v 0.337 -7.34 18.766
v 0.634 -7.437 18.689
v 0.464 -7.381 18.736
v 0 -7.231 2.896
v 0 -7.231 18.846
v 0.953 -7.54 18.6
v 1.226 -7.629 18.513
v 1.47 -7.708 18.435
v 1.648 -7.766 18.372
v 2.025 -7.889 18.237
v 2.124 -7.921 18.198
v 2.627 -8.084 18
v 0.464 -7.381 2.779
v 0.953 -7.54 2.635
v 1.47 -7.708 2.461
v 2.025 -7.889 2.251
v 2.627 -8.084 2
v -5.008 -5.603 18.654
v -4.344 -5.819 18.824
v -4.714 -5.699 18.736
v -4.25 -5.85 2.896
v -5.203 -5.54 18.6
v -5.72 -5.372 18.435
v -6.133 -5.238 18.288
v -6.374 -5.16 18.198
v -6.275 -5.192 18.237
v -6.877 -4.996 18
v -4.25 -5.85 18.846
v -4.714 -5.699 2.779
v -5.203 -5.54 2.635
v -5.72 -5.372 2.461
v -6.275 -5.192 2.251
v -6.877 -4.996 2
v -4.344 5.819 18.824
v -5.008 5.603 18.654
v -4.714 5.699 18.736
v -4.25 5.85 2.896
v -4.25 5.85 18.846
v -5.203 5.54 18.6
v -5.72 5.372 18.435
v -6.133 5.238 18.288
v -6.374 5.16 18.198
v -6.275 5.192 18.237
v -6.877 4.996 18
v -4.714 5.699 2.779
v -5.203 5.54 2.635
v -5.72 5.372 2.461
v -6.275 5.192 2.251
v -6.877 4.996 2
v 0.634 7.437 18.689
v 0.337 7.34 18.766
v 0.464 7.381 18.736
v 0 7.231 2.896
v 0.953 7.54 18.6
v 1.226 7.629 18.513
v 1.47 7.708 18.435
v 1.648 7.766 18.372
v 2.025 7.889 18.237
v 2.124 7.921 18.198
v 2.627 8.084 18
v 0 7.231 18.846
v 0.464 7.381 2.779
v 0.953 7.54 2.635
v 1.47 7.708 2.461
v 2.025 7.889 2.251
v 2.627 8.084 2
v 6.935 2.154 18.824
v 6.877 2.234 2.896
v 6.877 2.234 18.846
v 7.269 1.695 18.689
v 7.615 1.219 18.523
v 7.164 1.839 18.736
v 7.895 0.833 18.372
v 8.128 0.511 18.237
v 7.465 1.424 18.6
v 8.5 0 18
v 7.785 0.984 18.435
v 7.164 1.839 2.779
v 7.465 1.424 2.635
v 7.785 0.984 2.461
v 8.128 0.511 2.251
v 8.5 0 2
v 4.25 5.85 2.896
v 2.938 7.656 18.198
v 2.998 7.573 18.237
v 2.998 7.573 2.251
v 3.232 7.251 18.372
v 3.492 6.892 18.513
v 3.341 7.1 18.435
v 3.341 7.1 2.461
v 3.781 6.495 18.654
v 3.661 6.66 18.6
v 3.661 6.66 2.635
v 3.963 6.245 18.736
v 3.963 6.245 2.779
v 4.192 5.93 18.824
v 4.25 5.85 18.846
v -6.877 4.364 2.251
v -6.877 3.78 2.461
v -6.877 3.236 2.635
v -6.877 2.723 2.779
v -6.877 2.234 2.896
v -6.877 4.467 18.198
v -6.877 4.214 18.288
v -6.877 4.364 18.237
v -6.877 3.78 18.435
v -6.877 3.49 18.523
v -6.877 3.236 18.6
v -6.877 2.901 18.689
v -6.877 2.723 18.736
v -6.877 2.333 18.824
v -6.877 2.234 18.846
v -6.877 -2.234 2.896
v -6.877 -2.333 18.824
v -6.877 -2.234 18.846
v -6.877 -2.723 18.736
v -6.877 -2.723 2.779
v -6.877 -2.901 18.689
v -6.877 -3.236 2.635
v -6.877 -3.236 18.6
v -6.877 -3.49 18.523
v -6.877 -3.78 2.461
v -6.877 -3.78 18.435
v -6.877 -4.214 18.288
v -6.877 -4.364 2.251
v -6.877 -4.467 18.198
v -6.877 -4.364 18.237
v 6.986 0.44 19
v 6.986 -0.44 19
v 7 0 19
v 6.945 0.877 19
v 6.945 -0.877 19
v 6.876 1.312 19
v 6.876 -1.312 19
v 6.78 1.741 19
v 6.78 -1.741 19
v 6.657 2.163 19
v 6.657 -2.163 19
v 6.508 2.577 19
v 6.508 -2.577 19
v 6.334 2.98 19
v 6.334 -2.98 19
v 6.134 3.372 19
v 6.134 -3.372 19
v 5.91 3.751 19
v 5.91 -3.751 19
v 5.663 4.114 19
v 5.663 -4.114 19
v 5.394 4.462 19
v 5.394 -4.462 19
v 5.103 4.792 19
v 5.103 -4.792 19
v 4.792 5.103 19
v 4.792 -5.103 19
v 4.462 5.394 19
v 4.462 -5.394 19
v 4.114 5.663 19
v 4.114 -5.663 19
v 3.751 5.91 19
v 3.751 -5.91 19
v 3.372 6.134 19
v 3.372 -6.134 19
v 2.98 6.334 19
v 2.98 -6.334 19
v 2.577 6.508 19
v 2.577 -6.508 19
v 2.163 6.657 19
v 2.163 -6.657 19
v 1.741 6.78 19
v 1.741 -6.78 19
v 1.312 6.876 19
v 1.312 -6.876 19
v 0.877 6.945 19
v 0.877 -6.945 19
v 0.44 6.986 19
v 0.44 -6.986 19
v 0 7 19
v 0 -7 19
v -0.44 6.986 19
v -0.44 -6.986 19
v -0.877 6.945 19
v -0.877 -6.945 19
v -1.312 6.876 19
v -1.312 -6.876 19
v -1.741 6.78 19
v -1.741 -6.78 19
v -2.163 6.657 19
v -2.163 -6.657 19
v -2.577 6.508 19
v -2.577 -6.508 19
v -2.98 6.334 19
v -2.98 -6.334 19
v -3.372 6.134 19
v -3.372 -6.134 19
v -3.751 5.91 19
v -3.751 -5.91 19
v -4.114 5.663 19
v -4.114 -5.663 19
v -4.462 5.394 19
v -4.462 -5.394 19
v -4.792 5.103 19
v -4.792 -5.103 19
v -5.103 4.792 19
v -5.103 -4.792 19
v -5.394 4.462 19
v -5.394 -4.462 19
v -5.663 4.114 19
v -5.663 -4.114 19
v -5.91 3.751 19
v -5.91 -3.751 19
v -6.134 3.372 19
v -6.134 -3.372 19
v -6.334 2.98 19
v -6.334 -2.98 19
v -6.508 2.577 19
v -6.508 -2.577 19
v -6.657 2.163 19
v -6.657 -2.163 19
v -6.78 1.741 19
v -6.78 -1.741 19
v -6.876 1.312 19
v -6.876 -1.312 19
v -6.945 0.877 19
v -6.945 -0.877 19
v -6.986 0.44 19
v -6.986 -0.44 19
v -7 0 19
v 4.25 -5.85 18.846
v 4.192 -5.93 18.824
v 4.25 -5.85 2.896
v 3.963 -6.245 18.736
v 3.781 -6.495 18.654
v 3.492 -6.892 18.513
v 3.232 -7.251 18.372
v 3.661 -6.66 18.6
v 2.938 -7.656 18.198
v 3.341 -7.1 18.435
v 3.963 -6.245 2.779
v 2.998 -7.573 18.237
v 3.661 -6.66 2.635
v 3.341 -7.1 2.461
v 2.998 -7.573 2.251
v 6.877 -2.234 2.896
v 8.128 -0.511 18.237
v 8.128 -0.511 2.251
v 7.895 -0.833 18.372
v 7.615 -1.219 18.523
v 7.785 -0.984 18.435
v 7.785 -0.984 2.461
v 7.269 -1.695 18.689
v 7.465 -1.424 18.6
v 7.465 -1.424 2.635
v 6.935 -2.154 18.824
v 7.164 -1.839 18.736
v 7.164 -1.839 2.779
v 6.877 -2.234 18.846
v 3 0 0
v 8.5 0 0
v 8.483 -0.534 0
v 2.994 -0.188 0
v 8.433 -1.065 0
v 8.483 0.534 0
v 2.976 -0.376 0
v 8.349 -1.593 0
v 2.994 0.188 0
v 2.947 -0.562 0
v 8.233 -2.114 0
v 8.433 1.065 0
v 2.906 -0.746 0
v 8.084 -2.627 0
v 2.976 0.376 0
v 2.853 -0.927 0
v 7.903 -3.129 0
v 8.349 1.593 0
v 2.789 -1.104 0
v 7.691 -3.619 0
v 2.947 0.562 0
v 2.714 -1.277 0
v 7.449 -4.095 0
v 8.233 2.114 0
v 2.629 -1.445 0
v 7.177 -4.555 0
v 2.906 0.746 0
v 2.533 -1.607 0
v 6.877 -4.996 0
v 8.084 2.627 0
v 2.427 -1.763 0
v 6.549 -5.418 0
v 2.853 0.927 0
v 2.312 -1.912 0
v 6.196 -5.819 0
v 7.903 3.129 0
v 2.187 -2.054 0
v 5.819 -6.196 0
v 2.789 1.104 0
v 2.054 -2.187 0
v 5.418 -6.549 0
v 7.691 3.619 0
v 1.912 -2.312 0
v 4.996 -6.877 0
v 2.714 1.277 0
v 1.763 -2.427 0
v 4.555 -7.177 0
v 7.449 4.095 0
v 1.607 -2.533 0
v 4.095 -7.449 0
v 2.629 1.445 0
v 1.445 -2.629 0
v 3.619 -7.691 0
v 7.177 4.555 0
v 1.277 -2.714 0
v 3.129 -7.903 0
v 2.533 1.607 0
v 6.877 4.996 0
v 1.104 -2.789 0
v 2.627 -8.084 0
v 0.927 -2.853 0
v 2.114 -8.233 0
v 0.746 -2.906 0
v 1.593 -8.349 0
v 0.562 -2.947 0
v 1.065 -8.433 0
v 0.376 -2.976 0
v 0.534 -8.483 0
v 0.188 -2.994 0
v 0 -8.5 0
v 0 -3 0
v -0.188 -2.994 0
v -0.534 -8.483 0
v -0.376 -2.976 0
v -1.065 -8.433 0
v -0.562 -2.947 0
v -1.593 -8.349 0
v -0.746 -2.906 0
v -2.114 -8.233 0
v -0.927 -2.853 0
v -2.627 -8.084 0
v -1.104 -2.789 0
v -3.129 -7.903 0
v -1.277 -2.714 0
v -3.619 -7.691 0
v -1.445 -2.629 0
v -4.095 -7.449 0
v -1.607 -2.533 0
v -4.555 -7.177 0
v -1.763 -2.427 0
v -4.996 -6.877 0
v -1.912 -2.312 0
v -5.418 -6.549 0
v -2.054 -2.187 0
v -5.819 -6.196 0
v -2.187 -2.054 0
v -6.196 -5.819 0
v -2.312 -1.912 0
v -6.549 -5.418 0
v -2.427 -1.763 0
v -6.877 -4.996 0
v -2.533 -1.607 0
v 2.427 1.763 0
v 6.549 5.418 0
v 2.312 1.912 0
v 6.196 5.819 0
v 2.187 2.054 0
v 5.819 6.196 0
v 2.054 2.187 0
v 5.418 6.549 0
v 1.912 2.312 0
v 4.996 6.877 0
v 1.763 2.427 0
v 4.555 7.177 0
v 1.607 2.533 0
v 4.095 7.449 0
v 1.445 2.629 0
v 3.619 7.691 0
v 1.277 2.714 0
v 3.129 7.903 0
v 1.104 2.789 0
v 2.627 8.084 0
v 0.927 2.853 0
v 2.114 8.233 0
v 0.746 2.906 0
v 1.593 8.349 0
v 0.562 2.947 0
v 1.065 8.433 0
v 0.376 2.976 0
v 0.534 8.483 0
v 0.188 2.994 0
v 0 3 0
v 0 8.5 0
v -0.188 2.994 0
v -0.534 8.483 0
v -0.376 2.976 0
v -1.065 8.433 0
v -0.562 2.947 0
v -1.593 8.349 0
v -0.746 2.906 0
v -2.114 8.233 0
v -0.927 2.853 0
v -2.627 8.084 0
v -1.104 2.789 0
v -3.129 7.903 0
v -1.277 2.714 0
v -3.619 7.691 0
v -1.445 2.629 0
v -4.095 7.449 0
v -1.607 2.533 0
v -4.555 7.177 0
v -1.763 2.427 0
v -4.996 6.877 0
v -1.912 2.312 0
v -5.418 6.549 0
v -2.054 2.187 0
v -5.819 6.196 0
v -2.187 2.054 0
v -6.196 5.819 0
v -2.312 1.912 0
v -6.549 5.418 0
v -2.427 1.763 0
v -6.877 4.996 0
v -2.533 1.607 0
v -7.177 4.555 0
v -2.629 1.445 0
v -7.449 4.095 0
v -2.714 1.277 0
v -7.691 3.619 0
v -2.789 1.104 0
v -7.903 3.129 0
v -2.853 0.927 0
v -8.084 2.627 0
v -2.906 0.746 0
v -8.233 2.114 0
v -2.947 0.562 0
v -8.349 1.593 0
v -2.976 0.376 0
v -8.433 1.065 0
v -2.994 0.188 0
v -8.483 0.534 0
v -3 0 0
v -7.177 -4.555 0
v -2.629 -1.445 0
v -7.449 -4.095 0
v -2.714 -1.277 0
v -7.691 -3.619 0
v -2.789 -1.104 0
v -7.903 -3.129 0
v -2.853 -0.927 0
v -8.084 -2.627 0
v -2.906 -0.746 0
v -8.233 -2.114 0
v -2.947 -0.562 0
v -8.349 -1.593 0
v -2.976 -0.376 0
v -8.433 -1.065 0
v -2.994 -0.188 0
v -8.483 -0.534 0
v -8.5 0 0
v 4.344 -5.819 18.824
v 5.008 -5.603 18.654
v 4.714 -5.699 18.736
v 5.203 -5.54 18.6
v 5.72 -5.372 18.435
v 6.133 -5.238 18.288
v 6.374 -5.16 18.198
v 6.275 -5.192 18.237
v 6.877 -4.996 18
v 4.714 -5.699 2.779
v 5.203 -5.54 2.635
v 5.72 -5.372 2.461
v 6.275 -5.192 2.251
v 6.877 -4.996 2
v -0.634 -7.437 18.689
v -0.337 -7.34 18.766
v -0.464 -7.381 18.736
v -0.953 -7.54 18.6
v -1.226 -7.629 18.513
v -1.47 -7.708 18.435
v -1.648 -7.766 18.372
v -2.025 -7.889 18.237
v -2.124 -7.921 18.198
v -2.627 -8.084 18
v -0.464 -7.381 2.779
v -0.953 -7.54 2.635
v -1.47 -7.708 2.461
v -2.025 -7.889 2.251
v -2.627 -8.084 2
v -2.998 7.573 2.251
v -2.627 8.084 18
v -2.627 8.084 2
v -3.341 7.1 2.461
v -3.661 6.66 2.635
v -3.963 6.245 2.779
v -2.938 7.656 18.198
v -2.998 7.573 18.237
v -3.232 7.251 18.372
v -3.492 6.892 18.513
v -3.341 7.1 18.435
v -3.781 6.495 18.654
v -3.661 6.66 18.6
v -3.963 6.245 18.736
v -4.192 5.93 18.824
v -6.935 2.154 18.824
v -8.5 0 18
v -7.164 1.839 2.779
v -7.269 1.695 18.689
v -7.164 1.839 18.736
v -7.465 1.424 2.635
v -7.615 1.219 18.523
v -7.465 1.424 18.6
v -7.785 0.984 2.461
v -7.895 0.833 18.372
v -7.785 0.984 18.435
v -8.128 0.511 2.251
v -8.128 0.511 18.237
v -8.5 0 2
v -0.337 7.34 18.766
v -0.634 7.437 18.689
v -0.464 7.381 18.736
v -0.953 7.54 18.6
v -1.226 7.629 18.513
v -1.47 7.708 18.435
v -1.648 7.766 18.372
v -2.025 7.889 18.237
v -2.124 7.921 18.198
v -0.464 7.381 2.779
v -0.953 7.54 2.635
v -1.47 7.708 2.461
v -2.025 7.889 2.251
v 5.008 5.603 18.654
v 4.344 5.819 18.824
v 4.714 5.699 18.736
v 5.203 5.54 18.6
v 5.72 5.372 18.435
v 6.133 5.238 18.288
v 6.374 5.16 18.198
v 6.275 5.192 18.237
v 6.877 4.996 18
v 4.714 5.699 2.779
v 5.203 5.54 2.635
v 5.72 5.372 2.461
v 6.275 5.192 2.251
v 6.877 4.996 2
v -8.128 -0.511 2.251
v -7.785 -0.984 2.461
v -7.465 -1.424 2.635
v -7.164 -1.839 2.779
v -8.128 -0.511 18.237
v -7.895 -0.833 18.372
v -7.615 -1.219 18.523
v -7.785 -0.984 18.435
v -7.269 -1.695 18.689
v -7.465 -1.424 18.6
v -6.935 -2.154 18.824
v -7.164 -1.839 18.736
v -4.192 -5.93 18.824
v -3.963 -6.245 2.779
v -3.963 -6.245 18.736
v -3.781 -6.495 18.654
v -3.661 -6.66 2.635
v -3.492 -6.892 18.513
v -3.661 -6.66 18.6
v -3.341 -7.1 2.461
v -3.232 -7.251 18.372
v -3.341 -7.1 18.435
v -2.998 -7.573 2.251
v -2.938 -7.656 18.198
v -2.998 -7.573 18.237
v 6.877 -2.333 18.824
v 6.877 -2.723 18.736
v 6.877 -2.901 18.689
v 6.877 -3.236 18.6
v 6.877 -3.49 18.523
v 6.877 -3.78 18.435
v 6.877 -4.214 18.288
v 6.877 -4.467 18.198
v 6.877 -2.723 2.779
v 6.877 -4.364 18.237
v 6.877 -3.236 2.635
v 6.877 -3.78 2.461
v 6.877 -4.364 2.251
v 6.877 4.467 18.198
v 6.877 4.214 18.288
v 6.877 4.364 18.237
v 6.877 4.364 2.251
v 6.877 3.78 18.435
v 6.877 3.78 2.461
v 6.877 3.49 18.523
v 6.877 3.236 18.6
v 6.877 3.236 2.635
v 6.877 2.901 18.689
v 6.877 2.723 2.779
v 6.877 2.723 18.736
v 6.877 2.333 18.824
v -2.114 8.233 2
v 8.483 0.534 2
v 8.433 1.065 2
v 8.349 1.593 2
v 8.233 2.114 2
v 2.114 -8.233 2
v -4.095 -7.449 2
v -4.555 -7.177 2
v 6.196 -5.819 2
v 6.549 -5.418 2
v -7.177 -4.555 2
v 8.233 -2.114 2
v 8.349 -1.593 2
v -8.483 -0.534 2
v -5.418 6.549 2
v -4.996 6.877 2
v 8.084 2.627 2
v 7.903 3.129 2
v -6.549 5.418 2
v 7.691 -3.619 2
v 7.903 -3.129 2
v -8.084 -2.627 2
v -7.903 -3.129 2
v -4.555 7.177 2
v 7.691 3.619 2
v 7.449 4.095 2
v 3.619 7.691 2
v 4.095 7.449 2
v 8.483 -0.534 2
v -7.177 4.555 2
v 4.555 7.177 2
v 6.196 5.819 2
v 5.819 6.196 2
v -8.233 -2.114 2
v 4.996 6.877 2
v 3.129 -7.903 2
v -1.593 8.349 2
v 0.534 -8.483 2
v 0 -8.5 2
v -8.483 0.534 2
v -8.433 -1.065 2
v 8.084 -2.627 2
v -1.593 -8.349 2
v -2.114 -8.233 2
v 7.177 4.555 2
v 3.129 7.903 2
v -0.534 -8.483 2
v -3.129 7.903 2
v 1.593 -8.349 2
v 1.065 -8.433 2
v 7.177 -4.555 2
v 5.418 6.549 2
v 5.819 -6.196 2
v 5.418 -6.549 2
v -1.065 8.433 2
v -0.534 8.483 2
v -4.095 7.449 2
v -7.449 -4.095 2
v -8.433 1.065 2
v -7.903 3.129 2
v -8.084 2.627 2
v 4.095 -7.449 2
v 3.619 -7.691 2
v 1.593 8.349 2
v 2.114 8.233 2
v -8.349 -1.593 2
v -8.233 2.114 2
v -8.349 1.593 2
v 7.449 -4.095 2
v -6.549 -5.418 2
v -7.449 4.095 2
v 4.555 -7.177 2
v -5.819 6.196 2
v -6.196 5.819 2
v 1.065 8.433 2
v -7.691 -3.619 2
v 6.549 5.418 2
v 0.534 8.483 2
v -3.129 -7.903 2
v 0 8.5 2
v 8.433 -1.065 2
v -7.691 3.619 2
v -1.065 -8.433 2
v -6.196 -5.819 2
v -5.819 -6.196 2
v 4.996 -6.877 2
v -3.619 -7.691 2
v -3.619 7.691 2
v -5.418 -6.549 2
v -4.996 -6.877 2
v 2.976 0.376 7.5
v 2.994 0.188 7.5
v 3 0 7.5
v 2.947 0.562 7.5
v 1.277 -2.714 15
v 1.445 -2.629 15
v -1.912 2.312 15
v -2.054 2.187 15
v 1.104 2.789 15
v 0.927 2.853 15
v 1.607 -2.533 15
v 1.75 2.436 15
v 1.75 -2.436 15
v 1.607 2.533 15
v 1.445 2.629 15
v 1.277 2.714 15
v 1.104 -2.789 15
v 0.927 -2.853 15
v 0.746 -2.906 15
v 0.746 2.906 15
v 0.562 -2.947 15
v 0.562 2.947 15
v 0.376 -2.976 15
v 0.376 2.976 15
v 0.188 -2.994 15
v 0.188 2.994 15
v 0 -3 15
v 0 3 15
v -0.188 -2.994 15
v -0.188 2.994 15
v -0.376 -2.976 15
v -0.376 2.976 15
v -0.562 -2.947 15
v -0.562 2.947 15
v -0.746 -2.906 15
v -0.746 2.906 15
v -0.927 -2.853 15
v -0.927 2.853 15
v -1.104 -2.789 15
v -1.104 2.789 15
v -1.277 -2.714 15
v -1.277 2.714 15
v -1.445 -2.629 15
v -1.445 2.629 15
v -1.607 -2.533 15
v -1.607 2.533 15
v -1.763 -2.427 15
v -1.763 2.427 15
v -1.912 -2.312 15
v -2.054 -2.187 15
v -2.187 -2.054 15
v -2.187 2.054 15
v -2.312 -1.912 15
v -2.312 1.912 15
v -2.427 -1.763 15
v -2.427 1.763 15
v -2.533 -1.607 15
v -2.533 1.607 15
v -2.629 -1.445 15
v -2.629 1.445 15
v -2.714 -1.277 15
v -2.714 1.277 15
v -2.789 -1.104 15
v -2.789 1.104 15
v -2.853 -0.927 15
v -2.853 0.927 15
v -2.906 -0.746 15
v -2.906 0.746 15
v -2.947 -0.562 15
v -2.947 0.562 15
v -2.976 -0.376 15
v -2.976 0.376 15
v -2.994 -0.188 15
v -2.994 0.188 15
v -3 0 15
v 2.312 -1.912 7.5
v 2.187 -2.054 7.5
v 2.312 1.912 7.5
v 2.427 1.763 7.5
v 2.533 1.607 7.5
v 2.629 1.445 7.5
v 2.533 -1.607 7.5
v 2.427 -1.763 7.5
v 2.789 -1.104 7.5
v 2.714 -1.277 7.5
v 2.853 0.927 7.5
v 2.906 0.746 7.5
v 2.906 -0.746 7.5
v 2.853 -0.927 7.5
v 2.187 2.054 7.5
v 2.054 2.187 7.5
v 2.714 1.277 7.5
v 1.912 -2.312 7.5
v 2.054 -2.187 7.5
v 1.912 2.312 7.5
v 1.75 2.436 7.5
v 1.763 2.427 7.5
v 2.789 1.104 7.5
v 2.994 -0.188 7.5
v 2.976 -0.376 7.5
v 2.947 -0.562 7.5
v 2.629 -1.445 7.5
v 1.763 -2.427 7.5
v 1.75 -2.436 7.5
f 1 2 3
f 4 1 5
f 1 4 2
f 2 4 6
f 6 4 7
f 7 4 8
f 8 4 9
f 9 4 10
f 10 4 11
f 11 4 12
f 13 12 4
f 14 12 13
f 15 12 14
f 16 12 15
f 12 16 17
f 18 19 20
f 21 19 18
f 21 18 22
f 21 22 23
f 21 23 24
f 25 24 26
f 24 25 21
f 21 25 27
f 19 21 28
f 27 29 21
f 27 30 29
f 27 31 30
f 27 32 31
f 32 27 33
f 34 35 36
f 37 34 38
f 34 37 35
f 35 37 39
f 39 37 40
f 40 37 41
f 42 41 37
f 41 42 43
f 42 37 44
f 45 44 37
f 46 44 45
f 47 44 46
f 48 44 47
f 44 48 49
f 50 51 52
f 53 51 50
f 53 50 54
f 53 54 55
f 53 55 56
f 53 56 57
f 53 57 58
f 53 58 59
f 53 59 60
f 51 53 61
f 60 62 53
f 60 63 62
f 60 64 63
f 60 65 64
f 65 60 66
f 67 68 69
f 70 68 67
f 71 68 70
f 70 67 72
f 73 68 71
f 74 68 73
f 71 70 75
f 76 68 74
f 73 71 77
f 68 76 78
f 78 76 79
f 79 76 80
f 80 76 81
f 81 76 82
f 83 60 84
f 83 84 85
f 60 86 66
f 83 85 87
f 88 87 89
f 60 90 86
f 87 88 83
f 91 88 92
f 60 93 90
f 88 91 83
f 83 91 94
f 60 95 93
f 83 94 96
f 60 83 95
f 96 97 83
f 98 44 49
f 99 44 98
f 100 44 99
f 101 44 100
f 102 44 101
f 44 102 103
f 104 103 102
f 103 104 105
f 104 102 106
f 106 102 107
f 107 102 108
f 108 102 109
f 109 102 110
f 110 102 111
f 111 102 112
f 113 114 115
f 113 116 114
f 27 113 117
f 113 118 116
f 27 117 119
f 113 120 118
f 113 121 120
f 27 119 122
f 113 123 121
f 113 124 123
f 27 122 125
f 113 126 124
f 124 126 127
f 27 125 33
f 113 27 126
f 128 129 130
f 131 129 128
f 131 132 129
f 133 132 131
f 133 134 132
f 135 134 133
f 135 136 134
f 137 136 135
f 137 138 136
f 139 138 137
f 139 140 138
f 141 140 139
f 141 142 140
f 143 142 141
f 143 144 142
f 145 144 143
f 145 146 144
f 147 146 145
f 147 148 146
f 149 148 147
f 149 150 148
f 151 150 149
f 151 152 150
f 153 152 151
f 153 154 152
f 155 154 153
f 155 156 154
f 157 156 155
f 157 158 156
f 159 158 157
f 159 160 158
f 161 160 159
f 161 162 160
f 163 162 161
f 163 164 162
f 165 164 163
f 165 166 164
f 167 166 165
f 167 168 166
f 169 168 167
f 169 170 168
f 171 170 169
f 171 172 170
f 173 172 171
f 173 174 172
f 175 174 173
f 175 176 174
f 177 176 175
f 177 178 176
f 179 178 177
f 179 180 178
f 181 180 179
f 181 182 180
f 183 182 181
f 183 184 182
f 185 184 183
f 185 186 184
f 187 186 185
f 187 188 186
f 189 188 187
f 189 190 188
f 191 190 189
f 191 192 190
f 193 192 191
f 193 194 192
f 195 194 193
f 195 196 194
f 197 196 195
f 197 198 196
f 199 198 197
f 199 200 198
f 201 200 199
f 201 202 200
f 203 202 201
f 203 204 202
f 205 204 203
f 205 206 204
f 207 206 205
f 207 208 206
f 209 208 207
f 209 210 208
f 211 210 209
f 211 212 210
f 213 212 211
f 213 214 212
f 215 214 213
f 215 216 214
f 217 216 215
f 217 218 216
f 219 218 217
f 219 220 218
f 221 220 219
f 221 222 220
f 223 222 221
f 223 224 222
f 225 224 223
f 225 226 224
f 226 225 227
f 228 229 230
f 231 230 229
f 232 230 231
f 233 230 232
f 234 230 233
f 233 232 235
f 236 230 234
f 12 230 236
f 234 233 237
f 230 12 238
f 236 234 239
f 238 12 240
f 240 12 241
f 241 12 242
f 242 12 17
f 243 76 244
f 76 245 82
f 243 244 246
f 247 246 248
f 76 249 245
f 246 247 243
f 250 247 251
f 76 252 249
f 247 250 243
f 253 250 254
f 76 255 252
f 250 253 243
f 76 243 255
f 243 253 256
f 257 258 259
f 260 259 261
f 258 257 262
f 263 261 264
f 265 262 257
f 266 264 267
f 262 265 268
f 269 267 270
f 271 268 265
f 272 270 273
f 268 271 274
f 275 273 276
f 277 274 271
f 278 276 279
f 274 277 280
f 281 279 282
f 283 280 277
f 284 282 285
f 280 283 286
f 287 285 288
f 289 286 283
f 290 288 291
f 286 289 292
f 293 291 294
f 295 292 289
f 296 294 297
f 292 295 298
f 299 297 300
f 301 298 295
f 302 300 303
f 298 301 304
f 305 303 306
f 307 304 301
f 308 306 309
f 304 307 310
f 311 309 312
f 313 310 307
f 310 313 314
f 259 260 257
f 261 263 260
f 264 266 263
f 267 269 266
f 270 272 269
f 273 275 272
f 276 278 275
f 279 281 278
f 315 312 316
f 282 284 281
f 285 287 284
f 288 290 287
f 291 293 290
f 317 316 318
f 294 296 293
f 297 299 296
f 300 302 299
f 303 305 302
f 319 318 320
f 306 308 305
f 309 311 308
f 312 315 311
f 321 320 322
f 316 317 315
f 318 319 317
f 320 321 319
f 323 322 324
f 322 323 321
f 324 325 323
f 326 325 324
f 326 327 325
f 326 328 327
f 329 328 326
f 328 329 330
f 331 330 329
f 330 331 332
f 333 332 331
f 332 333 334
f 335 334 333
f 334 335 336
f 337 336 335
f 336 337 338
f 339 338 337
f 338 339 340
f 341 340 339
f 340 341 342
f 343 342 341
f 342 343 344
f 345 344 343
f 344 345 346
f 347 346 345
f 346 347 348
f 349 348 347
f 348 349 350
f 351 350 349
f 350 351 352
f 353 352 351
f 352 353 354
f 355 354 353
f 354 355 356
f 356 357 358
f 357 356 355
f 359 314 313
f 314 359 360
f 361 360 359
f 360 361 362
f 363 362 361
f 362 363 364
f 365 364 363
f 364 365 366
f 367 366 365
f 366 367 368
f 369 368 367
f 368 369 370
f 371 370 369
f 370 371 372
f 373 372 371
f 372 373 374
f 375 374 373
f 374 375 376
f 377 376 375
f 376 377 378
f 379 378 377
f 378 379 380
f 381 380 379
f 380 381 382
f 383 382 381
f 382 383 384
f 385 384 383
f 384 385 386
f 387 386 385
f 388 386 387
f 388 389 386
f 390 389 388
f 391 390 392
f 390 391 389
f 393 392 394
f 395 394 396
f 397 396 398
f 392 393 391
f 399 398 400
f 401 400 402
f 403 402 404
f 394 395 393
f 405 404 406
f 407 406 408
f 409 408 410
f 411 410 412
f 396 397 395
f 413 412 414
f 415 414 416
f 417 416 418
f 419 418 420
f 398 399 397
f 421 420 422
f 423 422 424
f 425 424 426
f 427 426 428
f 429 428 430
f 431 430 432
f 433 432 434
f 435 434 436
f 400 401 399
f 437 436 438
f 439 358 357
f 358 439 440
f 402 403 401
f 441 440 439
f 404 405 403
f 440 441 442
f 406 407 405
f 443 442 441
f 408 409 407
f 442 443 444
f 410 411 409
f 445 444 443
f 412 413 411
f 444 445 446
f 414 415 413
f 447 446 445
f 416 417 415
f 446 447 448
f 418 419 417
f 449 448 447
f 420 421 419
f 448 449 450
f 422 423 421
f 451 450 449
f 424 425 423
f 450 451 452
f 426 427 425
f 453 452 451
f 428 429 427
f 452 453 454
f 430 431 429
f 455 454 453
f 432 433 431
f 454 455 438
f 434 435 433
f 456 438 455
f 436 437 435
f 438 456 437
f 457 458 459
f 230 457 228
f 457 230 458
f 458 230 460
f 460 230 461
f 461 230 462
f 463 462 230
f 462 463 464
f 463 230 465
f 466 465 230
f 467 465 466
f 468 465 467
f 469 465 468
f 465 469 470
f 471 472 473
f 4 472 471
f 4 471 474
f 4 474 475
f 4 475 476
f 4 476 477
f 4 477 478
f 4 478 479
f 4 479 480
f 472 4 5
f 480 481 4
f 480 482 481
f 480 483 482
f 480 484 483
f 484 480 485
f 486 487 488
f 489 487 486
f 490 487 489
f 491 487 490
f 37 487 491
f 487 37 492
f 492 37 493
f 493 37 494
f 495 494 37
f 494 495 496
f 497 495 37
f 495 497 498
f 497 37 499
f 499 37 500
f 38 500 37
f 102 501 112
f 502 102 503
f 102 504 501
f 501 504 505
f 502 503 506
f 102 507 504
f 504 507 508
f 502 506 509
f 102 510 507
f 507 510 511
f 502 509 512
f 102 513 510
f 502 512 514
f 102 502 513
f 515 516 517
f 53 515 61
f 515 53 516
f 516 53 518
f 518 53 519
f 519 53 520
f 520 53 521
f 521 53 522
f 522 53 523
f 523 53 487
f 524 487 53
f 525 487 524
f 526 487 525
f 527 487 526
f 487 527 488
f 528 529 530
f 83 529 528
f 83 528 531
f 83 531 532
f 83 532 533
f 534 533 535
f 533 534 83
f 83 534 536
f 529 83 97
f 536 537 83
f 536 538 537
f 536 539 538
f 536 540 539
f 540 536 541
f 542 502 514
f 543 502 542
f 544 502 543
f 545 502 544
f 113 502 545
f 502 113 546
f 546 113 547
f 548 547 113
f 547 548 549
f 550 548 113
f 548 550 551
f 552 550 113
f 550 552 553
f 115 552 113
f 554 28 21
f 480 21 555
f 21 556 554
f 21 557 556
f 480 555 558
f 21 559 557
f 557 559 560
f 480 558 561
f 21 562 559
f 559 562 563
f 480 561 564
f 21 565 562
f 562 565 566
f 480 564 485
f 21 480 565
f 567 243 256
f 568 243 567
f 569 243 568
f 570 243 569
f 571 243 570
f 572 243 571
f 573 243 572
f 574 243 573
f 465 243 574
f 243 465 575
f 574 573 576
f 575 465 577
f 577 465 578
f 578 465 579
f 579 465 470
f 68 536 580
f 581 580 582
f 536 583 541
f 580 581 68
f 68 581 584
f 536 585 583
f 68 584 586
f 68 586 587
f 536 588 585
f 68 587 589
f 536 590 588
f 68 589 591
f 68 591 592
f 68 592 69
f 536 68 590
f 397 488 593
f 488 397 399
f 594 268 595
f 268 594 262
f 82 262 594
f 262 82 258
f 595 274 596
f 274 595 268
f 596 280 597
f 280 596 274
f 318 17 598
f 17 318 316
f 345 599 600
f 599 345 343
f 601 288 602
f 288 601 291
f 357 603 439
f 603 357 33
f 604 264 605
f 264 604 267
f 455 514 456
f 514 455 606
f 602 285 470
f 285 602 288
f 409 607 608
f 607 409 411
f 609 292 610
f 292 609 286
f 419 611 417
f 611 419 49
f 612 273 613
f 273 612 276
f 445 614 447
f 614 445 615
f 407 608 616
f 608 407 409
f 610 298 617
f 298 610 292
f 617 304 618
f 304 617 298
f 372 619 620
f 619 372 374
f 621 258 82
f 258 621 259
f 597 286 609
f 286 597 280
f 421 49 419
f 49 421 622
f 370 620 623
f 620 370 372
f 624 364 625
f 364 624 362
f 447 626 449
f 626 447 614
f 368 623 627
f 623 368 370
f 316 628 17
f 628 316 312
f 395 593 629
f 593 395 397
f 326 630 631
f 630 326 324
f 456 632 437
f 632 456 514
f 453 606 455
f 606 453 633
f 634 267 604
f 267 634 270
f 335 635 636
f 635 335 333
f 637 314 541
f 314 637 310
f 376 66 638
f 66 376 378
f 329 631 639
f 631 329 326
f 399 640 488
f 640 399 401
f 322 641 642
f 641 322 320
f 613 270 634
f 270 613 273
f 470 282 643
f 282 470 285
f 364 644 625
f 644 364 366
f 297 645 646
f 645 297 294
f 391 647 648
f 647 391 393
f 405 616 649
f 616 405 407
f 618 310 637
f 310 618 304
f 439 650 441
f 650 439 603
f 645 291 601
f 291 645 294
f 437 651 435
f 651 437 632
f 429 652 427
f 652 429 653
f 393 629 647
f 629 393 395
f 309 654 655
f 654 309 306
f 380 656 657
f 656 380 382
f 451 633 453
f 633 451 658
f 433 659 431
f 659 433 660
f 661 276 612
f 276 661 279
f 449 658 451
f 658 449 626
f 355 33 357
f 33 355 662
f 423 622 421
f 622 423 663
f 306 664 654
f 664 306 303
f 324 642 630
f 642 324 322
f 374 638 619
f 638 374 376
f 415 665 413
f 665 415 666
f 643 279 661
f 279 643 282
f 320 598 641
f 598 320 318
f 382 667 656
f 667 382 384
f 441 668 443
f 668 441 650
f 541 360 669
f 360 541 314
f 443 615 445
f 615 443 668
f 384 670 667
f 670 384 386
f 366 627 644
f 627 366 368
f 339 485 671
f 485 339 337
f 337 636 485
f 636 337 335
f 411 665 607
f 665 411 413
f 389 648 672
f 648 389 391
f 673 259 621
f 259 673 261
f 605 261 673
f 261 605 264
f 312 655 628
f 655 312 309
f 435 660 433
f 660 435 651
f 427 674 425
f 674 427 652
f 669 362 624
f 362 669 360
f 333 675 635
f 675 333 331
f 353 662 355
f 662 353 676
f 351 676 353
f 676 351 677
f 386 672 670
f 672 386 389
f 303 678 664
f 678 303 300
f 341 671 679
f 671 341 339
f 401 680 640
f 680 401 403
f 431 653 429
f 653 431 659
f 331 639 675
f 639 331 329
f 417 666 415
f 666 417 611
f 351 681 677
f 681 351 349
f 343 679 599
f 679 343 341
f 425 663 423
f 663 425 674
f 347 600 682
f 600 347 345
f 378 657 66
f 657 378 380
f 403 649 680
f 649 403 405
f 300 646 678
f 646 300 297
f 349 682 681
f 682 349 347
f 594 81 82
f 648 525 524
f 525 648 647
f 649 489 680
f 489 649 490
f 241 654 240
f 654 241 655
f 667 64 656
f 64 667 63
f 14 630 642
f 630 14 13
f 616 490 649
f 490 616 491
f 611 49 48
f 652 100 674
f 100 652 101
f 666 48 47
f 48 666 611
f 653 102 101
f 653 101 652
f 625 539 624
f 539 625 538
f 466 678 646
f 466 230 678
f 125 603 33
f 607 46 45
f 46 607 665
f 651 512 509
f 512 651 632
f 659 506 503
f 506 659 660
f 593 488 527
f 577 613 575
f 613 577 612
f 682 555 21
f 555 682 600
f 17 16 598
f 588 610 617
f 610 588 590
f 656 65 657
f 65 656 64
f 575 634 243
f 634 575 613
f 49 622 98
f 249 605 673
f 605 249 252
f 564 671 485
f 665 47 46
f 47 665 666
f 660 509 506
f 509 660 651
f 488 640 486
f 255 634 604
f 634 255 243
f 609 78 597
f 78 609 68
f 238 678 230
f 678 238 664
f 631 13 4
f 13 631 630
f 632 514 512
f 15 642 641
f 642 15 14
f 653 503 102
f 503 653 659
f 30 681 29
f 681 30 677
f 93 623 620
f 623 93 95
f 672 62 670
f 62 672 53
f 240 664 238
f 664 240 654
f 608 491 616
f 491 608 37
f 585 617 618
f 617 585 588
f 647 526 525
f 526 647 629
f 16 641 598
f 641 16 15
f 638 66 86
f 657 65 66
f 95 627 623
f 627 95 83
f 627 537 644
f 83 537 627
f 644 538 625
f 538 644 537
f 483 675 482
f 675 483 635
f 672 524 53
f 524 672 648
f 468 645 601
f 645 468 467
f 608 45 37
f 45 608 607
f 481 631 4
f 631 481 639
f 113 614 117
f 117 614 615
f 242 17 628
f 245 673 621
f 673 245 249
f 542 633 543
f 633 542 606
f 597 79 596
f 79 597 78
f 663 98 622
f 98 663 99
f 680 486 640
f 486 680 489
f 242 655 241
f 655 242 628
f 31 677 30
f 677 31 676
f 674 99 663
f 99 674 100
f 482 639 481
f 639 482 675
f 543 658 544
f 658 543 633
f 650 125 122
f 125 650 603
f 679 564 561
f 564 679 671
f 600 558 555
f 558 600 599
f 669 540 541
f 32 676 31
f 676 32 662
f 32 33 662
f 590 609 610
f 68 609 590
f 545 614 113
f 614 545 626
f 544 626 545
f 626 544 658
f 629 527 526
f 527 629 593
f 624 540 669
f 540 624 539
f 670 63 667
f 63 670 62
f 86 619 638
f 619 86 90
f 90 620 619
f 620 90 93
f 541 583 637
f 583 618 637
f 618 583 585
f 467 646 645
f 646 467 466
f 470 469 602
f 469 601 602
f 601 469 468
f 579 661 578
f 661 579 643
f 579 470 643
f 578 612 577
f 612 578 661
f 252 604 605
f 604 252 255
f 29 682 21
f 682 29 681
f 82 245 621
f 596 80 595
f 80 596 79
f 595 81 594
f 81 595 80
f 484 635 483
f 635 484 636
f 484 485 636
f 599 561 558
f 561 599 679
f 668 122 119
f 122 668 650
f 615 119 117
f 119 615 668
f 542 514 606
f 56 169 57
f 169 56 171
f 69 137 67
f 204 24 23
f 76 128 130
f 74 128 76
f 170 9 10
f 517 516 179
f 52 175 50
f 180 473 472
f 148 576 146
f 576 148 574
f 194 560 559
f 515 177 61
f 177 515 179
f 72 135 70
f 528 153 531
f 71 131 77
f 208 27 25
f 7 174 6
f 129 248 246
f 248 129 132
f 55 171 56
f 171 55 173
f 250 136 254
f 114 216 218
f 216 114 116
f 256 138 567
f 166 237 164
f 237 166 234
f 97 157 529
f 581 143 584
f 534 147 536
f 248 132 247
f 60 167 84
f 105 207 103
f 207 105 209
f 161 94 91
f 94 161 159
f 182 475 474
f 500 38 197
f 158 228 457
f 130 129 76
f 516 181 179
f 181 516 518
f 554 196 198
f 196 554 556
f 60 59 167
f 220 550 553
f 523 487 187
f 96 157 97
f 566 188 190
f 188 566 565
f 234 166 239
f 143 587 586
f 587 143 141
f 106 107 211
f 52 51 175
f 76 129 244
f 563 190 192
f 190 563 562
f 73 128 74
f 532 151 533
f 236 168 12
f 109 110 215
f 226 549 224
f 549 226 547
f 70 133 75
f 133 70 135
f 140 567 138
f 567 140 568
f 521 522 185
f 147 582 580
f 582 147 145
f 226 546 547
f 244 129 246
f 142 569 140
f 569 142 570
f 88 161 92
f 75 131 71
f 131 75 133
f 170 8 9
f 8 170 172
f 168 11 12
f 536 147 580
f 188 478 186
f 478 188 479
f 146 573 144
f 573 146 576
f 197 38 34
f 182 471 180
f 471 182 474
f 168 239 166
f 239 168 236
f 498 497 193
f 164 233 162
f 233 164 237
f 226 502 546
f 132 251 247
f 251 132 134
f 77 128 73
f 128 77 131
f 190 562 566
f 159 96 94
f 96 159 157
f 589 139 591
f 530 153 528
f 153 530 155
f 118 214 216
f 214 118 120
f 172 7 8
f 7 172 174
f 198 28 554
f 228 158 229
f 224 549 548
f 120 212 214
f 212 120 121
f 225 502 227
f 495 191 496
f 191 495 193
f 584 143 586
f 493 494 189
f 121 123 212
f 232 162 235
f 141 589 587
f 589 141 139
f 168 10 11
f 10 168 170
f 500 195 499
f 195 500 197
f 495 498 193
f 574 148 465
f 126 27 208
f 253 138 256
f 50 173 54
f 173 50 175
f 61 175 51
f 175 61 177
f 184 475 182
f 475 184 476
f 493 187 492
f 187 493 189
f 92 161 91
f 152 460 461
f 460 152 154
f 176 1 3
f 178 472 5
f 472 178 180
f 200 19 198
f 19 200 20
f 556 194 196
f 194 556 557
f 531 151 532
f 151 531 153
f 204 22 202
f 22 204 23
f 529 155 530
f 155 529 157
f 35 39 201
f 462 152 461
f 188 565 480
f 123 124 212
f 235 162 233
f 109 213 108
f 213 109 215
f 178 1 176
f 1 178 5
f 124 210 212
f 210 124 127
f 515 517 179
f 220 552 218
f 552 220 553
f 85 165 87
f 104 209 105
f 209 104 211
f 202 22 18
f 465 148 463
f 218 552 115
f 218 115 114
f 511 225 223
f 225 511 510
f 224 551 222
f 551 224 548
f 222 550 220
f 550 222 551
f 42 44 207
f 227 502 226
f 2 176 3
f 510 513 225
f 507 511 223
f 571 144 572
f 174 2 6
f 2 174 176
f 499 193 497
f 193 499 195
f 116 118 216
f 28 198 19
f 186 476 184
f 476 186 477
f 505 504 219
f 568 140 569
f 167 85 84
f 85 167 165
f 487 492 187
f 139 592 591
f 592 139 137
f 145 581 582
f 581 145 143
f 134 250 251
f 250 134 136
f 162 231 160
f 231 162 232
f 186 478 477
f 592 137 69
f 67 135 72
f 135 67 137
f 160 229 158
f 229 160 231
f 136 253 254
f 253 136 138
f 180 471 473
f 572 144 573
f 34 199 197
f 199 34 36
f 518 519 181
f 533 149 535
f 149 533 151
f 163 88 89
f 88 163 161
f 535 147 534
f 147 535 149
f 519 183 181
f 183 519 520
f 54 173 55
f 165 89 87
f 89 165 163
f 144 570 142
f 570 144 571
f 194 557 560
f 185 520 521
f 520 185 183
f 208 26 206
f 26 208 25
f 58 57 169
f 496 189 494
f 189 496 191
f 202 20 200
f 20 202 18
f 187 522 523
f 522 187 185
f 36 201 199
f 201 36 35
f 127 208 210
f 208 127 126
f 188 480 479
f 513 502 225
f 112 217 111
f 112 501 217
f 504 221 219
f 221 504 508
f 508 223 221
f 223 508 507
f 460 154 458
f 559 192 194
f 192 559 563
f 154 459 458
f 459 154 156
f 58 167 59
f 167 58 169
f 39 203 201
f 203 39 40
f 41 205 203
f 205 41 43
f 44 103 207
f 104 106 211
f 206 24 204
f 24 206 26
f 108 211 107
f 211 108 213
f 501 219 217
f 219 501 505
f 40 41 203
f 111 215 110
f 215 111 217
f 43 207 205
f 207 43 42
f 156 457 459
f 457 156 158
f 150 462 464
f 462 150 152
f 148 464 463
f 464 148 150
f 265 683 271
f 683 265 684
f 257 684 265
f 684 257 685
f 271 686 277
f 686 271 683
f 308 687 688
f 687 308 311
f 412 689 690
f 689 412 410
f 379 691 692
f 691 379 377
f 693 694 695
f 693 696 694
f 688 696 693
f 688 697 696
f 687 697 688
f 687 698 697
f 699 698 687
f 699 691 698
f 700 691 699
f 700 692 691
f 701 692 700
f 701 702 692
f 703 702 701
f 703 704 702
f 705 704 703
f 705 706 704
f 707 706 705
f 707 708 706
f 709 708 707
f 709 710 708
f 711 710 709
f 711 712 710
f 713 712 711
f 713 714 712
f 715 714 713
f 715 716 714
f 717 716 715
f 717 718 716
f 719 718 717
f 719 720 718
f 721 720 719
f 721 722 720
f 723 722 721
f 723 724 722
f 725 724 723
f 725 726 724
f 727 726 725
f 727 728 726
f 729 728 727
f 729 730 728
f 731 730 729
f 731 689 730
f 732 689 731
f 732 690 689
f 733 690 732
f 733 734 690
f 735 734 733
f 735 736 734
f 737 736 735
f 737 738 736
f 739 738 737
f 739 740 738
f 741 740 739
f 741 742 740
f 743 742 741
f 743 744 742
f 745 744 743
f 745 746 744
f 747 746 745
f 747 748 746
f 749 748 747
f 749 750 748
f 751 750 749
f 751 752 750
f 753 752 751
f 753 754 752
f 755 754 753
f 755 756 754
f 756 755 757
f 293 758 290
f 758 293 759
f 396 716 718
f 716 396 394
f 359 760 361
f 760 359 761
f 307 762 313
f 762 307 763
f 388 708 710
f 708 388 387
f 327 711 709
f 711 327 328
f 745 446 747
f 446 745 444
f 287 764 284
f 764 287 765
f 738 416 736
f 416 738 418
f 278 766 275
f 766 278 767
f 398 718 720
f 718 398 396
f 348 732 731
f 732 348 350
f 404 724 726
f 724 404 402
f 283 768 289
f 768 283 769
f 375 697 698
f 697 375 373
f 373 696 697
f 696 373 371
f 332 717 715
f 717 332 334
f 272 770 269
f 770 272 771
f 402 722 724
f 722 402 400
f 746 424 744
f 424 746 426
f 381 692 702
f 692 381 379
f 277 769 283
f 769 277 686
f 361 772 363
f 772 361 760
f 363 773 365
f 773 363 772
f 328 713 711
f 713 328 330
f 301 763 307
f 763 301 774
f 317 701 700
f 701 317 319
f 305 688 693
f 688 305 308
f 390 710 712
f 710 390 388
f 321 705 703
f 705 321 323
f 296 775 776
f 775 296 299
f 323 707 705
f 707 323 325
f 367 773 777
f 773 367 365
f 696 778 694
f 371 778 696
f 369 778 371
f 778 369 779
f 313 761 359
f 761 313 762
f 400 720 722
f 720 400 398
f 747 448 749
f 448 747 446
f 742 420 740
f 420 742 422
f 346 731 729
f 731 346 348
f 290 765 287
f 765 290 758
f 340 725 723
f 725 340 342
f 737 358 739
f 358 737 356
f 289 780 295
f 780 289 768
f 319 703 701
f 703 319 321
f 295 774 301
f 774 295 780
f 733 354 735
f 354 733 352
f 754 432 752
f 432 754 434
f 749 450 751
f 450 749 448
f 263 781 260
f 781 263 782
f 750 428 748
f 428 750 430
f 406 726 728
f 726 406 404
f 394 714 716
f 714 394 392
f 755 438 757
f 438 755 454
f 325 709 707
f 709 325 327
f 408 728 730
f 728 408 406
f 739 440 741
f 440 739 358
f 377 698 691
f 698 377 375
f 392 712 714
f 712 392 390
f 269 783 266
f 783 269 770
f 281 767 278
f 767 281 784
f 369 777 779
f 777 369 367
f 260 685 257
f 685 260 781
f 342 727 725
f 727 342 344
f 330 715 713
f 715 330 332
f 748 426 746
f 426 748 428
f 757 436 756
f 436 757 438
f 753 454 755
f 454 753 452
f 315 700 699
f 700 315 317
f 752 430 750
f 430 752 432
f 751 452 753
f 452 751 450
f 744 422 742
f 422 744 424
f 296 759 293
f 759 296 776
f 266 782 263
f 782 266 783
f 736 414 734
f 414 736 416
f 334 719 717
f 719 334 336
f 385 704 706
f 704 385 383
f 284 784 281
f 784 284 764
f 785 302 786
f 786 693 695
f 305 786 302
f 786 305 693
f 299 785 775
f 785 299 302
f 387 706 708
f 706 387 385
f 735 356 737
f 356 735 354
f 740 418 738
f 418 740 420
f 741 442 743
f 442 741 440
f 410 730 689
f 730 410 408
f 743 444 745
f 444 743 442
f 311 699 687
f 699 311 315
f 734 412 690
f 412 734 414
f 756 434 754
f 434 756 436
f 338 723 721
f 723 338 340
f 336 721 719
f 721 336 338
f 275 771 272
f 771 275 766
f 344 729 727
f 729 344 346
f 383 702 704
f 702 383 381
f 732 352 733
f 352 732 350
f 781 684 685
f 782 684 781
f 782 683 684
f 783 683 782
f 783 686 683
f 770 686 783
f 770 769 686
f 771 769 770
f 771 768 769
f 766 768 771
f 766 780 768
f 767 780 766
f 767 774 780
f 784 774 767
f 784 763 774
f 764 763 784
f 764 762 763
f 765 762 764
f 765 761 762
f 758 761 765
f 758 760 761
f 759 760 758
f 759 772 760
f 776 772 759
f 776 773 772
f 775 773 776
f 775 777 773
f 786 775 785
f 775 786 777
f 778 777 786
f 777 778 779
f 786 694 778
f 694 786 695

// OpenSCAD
// AWG Knob

// Parameters
// -----------------

// Knob Height
shaft_depth = 15;
height_addon = 4; // At least the wall thickness

// Knob width
knob_width = 17;

// D-shaft
dshaft_startdepth = 6;
dshaft_inset = 6.75;

// Knob finish
skirt_addon = 0; // Will add to knob width
skirt_depth = 2;
skirt_slope_height = 6;

grip_star = 5;
top_round_inset = 3;
top_round_height = 1;

// -----------------


// Build
// -----------------

dshaft_clear = shaft_depth - (shaft_depth - dshaft_startdepth);
height = shaft_depth + height_addon;
diameterBottom = knob_width + skirt_addon;

$fn = 100; // Smooth Model

difference(){
    intersection(){
        union(){
            cylinder(d=knob_width,h=height,$fn=grip_star);
            rotate(a=360/grip_star/2,v=[0,0,1]) {
                cylinder(d=knob_width,h=height,$fn=grip_star);
            };
            // bottom finish
            cylinder(d=diameterBottom,h=skirt_depth);
            translate([0,0,skirt_depth]) {
                cylinder(d1=diameterBottom,d2=0,h=skirt_slope_height);
            };
        };
        // top finish
        union(){
            cylinder(d1=diameterBottom,d2=knob_width,h=height-top_round_height);
            translate([0,0,height-top_round_height]) {
                cylinder(d1=knob_width,d2=knob_width-top_round_inset,h=top_round_height);
            };
        };
    };
    
    // Shaft
    //------
    difference(){
        union(){
            translate([0,0, -1]){
                cylinder(d=6,h=shaft_depth+1);
                cylinder(d1=6.5,d2=0,h=6.5);
            };
        }
        translate([0,0, dshaft_clear])
        translate([dshaft_inset,0,dshaft_startdepth])
        cube([10,10,shaft_depth-dshaft_clear],center=true);
    }
}
